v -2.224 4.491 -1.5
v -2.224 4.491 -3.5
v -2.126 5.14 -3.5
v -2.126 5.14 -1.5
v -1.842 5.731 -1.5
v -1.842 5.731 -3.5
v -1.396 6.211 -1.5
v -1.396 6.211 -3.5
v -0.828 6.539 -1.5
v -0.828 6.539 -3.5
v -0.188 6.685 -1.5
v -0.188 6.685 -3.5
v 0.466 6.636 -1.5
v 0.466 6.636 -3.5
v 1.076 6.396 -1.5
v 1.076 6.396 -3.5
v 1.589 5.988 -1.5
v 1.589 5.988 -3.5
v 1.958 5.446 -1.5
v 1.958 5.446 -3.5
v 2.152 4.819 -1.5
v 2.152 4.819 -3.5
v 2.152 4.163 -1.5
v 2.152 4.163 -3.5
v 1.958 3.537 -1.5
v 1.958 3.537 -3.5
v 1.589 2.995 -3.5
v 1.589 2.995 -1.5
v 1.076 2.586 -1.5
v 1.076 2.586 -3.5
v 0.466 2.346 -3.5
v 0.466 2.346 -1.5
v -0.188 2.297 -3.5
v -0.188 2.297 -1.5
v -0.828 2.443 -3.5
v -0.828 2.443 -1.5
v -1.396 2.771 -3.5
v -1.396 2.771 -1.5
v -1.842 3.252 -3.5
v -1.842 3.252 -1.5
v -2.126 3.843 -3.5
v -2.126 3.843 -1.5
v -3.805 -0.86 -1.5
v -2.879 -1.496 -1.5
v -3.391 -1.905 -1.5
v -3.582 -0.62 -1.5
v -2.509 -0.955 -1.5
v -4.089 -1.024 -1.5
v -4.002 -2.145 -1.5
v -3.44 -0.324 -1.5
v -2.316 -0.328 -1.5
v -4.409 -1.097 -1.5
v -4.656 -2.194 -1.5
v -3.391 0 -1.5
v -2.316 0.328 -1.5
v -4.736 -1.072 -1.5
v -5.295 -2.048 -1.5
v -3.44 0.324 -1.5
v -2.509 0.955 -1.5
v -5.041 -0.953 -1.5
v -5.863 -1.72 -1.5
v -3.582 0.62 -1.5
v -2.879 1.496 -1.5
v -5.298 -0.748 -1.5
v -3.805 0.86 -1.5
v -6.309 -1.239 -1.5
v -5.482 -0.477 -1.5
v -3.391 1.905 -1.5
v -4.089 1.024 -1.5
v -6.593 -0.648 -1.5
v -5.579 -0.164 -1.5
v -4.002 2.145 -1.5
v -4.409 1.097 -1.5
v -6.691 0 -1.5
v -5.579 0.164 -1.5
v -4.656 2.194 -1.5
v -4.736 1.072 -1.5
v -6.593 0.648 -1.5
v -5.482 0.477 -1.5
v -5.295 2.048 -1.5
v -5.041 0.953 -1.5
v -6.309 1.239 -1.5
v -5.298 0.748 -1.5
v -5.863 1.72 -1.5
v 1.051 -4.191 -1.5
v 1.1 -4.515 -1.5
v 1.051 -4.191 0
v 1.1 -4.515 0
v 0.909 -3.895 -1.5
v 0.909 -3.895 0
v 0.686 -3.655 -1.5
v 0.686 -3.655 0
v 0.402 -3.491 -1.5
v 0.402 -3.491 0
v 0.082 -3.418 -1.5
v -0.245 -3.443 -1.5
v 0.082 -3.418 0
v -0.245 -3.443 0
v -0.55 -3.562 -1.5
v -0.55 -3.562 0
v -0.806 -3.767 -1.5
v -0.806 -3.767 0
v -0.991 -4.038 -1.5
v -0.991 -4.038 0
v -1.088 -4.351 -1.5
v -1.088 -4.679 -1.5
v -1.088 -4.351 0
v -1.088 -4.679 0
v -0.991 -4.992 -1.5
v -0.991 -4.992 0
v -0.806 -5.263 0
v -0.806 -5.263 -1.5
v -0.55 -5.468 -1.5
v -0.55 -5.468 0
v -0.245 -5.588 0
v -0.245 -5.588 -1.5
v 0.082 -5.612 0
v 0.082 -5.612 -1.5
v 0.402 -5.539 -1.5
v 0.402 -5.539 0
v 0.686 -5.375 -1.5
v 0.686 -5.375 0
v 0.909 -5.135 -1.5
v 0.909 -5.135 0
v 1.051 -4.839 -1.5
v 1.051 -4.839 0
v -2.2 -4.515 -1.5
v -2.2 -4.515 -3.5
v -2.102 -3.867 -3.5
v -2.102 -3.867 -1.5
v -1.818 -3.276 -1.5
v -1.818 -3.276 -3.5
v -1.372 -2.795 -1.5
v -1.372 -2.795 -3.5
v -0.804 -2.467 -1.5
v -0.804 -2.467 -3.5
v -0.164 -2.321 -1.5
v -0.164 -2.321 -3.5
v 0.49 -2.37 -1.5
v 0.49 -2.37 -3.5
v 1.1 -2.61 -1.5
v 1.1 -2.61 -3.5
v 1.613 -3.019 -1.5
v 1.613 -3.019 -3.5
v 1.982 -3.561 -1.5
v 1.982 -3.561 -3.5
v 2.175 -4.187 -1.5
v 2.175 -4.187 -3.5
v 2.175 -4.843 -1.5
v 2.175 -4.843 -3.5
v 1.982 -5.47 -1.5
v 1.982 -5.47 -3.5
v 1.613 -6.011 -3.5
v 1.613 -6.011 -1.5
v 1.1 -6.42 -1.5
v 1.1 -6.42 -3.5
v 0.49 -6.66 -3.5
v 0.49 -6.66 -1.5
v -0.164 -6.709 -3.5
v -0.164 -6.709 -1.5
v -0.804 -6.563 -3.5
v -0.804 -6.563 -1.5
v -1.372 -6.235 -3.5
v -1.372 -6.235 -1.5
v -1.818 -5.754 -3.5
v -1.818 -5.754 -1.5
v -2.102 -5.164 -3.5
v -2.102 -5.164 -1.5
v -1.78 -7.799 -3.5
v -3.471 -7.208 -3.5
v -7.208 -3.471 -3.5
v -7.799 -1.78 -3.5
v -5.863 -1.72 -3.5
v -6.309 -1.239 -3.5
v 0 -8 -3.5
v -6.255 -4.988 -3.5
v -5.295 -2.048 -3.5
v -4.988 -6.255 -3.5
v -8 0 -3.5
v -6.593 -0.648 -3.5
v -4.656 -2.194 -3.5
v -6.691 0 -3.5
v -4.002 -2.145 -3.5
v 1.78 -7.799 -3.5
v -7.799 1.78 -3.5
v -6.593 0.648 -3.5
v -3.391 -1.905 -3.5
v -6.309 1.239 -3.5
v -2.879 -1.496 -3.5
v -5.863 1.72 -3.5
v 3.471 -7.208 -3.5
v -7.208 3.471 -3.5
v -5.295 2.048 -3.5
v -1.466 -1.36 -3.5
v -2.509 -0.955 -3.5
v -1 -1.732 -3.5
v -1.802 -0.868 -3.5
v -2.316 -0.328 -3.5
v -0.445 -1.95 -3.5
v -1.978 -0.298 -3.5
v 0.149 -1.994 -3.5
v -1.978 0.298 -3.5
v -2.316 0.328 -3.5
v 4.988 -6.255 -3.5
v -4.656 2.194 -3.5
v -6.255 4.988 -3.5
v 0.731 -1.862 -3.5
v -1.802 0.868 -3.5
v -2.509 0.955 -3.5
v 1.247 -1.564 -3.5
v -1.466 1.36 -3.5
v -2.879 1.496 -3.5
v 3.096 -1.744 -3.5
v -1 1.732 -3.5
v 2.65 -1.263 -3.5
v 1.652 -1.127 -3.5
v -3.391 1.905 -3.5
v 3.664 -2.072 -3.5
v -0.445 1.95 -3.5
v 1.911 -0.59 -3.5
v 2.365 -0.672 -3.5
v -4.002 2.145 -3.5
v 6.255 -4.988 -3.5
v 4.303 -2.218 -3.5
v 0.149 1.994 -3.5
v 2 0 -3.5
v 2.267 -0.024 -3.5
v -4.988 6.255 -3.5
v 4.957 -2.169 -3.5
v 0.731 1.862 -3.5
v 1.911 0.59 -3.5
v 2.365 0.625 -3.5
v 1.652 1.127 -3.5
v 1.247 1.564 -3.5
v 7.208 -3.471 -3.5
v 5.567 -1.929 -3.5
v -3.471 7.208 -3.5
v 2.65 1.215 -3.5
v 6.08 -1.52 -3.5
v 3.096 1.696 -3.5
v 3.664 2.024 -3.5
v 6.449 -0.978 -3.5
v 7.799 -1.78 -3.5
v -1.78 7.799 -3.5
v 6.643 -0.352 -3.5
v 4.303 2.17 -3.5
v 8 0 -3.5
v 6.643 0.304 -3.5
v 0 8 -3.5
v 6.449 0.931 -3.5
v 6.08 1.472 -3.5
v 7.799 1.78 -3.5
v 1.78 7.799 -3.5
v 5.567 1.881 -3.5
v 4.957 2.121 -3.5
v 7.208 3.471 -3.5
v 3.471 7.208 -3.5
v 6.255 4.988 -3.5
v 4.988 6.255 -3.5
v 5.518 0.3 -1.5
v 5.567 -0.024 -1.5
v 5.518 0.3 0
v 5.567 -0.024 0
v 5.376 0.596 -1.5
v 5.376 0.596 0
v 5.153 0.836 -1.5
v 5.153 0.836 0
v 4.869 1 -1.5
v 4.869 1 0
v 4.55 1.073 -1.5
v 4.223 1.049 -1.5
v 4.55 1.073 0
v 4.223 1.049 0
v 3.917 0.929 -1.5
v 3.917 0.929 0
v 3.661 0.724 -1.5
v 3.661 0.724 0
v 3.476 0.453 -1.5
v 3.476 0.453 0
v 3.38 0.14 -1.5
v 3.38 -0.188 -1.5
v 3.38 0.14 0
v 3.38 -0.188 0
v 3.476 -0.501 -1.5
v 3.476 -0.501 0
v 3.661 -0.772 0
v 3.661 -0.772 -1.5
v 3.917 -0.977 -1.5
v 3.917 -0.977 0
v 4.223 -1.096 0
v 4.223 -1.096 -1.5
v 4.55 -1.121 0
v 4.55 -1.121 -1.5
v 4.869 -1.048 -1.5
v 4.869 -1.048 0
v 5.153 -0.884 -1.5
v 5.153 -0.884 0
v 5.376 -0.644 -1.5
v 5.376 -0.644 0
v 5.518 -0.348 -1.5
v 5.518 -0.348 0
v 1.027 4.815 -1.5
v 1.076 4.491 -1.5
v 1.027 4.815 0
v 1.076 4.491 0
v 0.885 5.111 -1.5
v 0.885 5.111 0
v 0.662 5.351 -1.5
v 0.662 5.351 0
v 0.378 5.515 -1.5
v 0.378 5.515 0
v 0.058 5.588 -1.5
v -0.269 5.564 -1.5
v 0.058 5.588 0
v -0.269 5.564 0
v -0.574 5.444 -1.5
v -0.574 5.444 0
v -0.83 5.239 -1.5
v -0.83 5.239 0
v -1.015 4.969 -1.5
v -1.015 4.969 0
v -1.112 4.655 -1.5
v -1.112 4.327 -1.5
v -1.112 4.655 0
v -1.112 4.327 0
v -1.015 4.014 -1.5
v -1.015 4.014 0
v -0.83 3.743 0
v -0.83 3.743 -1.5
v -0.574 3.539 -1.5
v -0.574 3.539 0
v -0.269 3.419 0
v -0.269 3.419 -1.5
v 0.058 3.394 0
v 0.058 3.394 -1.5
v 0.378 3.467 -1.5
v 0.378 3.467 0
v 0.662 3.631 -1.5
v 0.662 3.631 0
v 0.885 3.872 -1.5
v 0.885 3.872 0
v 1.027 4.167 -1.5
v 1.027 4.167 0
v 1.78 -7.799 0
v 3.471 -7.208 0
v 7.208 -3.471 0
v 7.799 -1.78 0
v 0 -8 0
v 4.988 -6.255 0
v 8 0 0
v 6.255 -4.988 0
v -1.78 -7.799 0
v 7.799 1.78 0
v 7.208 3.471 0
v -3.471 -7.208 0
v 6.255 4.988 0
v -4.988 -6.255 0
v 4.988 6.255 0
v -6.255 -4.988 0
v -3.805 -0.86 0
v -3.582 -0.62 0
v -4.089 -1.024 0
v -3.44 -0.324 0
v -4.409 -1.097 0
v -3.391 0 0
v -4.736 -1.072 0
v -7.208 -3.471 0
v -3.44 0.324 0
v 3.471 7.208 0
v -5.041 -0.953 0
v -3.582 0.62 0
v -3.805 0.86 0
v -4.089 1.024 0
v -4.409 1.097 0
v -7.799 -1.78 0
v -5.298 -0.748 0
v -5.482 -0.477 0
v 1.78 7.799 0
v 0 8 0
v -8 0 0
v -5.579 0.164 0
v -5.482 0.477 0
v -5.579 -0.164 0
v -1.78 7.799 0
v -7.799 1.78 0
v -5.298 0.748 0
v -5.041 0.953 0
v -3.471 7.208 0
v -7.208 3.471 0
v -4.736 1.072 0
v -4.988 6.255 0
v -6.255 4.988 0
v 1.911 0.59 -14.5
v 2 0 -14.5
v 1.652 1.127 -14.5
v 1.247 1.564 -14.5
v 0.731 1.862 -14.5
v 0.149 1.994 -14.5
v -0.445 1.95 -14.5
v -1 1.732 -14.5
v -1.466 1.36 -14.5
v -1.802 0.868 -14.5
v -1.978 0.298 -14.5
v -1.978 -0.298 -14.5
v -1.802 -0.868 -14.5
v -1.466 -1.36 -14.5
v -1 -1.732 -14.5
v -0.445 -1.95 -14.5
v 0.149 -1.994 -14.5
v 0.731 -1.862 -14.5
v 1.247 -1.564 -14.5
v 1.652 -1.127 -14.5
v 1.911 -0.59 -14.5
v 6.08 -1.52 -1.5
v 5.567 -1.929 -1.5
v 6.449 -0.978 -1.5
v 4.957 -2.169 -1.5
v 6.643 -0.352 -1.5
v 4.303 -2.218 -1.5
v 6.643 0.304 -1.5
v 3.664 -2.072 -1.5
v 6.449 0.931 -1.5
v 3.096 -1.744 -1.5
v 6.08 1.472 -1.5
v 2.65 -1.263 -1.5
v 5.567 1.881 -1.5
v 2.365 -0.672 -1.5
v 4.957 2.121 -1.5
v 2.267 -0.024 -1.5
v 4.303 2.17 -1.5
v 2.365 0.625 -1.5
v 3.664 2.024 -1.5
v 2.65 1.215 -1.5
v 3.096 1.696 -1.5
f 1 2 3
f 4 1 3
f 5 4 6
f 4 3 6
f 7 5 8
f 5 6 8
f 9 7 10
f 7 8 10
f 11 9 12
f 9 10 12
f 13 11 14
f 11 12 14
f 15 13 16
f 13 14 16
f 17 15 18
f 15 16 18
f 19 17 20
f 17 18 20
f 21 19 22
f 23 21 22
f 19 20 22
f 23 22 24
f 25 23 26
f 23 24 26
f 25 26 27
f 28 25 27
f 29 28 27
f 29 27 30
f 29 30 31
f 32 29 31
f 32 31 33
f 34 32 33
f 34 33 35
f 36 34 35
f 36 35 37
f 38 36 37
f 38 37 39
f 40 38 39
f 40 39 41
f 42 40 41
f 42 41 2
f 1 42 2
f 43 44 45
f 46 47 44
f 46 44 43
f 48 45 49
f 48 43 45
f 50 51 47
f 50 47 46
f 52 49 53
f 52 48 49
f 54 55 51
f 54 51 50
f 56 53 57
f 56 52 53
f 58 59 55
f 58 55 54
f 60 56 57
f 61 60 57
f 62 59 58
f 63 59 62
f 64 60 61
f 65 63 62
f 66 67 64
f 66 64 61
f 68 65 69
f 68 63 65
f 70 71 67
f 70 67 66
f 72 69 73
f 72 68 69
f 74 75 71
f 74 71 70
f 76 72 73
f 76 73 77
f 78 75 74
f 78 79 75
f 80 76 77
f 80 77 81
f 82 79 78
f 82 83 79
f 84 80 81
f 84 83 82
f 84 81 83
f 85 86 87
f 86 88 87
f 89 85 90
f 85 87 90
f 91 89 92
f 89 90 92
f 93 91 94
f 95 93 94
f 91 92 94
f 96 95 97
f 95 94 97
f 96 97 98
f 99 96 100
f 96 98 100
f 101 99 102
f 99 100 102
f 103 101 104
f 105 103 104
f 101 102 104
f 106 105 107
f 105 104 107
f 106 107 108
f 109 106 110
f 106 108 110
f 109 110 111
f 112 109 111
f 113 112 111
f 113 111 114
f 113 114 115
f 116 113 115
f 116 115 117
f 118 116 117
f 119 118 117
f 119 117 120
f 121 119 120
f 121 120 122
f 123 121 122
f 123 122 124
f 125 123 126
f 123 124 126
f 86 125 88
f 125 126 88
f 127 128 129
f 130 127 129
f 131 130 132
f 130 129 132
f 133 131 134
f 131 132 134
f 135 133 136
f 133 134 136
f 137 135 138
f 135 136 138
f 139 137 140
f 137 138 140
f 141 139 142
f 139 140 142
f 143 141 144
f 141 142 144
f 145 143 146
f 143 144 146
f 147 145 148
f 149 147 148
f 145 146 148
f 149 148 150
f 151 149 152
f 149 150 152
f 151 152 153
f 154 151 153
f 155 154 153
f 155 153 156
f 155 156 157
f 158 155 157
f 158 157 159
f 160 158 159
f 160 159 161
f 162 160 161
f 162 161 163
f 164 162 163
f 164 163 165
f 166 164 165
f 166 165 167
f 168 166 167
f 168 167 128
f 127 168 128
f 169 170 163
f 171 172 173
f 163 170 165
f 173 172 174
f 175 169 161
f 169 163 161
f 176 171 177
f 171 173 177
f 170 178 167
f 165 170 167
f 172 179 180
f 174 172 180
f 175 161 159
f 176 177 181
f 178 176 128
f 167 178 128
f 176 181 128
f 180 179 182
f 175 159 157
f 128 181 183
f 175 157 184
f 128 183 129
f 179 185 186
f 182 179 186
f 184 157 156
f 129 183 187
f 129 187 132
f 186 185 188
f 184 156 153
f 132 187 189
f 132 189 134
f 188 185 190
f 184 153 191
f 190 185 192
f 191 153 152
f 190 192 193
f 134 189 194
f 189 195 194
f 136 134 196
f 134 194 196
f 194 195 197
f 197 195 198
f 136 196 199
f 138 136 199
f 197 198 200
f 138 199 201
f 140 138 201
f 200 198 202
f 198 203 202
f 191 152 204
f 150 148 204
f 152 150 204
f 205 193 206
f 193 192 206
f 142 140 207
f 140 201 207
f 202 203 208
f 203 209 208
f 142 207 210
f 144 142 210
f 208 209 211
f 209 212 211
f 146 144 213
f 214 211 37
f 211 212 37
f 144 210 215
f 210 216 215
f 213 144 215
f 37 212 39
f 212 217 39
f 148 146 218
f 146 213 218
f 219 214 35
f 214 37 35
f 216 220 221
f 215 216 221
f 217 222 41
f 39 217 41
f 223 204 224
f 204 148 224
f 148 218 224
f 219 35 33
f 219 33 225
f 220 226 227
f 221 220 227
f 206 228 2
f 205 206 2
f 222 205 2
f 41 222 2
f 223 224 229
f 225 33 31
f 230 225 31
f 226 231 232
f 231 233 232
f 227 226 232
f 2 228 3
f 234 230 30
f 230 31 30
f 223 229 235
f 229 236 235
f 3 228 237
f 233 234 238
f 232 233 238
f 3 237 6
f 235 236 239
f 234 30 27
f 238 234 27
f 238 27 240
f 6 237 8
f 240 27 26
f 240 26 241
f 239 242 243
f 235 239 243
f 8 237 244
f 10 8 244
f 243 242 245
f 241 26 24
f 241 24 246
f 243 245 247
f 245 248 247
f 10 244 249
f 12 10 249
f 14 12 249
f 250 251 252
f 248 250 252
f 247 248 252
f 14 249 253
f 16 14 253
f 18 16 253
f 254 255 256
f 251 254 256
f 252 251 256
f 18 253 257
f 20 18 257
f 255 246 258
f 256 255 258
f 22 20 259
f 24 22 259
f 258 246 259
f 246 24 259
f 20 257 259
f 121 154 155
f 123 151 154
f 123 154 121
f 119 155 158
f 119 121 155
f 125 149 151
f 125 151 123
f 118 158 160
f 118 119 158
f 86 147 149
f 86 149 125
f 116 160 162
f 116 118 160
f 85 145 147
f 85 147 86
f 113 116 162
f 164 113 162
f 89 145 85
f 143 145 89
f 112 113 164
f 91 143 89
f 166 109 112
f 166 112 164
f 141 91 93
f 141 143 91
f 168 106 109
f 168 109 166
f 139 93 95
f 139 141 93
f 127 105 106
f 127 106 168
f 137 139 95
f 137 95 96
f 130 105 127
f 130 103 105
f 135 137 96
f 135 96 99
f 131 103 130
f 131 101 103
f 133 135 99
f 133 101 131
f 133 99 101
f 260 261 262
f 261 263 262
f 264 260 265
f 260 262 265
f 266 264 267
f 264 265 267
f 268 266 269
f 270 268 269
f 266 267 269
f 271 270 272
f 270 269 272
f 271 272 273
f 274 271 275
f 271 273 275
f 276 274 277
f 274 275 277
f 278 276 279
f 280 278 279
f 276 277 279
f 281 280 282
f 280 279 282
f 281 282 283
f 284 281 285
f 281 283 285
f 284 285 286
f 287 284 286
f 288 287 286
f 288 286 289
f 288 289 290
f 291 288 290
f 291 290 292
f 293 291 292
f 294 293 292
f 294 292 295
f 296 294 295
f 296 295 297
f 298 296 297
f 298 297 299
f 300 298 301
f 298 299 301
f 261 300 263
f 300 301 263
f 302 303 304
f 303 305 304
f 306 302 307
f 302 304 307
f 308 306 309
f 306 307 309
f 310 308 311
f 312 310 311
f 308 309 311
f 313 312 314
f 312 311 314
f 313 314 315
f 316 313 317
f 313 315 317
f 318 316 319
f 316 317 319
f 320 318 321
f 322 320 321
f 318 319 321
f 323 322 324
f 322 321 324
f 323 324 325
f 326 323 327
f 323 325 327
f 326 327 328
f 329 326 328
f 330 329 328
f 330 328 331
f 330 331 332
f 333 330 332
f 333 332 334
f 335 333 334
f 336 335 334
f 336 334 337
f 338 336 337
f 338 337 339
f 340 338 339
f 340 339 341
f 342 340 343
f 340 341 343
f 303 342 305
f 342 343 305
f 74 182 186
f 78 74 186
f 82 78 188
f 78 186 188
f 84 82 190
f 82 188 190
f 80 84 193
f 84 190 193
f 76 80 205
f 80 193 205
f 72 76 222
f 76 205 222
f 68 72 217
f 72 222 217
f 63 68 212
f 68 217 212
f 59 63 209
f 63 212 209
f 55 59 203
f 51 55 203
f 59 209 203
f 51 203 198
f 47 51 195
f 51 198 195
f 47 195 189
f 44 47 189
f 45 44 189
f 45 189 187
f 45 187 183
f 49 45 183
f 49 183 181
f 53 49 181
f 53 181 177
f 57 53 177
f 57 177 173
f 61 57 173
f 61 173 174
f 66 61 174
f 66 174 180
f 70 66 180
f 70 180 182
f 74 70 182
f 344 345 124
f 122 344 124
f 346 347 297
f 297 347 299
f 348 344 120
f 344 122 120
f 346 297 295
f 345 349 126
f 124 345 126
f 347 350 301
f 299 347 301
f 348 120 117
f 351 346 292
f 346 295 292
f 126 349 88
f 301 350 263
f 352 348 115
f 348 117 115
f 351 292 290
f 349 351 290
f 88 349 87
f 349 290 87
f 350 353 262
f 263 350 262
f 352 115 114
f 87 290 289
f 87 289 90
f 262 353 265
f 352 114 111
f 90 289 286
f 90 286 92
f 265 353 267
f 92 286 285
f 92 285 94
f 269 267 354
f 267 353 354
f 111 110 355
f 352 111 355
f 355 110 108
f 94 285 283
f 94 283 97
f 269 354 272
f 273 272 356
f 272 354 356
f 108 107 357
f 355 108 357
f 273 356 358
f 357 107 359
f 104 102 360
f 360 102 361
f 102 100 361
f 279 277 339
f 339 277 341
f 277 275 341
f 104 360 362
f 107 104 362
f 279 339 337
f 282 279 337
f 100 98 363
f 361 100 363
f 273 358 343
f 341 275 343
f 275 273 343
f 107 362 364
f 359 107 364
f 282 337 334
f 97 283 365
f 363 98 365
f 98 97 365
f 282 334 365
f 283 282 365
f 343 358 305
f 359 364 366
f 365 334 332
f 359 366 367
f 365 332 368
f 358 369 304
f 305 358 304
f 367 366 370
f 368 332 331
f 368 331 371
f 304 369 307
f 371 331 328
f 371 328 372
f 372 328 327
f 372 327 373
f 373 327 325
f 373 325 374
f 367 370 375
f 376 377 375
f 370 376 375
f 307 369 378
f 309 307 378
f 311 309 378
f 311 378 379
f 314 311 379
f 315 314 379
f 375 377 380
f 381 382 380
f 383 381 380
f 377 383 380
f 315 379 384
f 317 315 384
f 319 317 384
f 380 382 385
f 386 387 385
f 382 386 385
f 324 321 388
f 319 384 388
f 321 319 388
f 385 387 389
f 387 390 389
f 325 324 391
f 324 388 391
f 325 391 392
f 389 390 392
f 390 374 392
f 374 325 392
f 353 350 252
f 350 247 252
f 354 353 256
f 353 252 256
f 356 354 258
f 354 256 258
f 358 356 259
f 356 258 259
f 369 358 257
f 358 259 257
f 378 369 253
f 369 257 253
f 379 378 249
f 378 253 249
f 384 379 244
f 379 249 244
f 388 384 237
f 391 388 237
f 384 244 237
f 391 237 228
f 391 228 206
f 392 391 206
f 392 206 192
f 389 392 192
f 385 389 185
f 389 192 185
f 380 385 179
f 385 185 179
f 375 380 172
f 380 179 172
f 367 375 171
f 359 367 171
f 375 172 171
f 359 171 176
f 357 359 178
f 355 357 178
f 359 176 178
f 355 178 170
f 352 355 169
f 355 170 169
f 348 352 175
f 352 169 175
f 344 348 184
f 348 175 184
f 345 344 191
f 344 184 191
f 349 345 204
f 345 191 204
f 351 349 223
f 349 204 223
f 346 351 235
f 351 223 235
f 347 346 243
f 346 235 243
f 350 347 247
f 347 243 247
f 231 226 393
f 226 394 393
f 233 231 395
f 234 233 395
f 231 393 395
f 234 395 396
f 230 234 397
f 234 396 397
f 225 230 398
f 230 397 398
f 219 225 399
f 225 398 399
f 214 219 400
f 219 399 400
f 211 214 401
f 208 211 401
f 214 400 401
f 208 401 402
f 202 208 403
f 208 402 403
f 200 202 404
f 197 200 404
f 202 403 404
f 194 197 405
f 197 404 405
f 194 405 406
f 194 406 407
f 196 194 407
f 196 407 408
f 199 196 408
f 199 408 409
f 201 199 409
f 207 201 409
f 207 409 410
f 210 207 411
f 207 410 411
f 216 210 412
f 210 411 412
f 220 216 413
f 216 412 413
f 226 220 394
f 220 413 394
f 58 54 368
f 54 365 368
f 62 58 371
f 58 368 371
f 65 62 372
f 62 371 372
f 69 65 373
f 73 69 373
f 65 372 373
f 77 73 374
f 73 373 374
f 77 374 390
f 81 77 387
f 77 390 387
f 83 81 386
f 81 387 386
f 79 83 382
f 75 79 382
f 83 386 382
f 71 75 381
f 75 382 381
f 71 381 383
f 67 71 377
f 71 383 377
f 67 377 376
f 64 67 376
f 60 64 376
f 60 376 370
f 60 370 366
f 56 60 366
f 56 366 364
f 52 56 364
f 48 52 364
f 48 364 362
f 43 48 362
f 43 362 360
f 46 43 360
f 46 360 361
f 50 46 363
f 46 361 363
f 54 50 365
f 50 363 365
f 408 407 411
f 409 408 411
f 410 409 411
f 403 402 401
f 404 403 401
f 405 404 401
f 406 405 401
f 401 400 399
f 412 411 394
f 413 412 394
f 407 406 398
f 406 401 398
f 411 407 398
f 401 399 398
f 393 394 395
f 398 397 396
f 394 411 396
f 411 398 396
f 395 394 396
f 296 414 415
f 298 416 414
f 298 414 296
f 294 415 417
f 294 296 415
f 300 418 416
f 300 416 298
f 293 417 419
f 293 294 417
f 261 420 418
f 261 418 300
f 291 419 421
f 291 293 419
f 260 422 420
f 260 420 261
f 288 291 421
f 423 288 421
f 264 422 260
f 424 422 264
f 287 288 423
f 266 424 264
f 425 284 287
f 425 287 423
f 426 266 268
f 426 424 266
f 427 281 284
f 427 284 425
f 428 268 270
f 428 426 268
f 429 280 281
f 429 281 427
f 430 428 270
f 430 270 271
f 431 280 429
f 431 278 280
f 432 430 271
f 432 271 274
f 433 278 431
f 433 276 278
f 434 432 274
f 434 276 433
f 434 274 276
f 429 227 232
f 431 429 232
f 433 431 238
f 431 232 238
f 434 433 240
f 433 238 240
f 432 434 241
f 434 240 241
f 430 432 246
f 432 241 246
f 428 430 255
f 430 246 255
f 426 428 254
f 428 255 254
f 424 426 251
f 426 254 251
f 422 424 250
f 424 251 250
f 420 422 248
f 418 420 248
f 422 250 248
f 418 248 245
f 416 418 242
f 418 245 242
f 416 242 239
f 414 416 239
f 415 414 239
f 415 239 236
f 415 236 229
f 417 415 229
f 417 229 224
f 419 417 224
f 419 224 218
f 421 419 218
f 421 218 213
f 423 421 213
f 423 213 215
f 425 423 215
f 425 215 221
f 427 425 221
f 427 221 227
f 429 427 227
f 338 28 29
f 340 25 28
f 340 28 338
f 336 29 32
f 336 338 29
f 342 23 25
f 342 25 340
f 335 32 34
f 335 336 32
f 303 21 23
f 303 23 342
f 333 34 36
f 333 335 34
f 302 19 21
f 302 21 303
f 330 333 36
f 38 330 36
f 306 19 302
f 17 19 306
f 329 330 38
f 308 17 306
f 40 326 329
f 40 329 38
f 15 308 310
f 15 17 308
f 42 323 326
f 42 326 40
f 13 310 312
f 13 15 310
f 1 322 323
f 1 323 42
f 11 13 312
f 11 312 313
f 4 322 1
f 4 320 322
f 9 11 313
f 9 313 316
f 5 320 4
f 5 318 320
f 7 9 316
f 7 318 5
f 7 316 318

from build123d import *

# Parameters (mm, degrees)
CBORE_FOR_M2_SHCS2_D           = 2.2
CBORE_FOR_M2_SHCS2_CBORE_D     = 4.4
CBORE_FOR_M2_SHCS2_CBORE_DEPTH = 2


with BuildPart() as part:
    # Sketch1 → Revolve1 (revolve)
    with BuildSketch(Plane(origin=(0, 0, 0), x_dir=(1, 0, 0), z_dir=(0, 1, 0))):
        Polygon((0, 0), (8, 0), (8, 3.5), (2, 3.5), (2, 14.5), (0, 14.5), align=None)
    revolve(axis=Axis((0, 0, -14.5), (0, 0, 1)))

    # CBORE for M2 SHCS2 (through all)
    with Locations(Plane(origin=(0, 0, -3.5), x_dir=(-1, 0, 0), z_dir=(0, 0, -1))):
        with Locations((4.49122807, 0), (0.023889511, 4.49122807), (-4.467338559, -0.023889511), (0, -4.515117581)):
            CounterBoreHole(CBORE_FOR_M2_SHCS2_D / 2, CBORE_FOR_M2_SHCS2_CBORE_D / 2, CBORE_FOR_M2_SHCS2_CBORE_DEPTH)


solid = part.part
